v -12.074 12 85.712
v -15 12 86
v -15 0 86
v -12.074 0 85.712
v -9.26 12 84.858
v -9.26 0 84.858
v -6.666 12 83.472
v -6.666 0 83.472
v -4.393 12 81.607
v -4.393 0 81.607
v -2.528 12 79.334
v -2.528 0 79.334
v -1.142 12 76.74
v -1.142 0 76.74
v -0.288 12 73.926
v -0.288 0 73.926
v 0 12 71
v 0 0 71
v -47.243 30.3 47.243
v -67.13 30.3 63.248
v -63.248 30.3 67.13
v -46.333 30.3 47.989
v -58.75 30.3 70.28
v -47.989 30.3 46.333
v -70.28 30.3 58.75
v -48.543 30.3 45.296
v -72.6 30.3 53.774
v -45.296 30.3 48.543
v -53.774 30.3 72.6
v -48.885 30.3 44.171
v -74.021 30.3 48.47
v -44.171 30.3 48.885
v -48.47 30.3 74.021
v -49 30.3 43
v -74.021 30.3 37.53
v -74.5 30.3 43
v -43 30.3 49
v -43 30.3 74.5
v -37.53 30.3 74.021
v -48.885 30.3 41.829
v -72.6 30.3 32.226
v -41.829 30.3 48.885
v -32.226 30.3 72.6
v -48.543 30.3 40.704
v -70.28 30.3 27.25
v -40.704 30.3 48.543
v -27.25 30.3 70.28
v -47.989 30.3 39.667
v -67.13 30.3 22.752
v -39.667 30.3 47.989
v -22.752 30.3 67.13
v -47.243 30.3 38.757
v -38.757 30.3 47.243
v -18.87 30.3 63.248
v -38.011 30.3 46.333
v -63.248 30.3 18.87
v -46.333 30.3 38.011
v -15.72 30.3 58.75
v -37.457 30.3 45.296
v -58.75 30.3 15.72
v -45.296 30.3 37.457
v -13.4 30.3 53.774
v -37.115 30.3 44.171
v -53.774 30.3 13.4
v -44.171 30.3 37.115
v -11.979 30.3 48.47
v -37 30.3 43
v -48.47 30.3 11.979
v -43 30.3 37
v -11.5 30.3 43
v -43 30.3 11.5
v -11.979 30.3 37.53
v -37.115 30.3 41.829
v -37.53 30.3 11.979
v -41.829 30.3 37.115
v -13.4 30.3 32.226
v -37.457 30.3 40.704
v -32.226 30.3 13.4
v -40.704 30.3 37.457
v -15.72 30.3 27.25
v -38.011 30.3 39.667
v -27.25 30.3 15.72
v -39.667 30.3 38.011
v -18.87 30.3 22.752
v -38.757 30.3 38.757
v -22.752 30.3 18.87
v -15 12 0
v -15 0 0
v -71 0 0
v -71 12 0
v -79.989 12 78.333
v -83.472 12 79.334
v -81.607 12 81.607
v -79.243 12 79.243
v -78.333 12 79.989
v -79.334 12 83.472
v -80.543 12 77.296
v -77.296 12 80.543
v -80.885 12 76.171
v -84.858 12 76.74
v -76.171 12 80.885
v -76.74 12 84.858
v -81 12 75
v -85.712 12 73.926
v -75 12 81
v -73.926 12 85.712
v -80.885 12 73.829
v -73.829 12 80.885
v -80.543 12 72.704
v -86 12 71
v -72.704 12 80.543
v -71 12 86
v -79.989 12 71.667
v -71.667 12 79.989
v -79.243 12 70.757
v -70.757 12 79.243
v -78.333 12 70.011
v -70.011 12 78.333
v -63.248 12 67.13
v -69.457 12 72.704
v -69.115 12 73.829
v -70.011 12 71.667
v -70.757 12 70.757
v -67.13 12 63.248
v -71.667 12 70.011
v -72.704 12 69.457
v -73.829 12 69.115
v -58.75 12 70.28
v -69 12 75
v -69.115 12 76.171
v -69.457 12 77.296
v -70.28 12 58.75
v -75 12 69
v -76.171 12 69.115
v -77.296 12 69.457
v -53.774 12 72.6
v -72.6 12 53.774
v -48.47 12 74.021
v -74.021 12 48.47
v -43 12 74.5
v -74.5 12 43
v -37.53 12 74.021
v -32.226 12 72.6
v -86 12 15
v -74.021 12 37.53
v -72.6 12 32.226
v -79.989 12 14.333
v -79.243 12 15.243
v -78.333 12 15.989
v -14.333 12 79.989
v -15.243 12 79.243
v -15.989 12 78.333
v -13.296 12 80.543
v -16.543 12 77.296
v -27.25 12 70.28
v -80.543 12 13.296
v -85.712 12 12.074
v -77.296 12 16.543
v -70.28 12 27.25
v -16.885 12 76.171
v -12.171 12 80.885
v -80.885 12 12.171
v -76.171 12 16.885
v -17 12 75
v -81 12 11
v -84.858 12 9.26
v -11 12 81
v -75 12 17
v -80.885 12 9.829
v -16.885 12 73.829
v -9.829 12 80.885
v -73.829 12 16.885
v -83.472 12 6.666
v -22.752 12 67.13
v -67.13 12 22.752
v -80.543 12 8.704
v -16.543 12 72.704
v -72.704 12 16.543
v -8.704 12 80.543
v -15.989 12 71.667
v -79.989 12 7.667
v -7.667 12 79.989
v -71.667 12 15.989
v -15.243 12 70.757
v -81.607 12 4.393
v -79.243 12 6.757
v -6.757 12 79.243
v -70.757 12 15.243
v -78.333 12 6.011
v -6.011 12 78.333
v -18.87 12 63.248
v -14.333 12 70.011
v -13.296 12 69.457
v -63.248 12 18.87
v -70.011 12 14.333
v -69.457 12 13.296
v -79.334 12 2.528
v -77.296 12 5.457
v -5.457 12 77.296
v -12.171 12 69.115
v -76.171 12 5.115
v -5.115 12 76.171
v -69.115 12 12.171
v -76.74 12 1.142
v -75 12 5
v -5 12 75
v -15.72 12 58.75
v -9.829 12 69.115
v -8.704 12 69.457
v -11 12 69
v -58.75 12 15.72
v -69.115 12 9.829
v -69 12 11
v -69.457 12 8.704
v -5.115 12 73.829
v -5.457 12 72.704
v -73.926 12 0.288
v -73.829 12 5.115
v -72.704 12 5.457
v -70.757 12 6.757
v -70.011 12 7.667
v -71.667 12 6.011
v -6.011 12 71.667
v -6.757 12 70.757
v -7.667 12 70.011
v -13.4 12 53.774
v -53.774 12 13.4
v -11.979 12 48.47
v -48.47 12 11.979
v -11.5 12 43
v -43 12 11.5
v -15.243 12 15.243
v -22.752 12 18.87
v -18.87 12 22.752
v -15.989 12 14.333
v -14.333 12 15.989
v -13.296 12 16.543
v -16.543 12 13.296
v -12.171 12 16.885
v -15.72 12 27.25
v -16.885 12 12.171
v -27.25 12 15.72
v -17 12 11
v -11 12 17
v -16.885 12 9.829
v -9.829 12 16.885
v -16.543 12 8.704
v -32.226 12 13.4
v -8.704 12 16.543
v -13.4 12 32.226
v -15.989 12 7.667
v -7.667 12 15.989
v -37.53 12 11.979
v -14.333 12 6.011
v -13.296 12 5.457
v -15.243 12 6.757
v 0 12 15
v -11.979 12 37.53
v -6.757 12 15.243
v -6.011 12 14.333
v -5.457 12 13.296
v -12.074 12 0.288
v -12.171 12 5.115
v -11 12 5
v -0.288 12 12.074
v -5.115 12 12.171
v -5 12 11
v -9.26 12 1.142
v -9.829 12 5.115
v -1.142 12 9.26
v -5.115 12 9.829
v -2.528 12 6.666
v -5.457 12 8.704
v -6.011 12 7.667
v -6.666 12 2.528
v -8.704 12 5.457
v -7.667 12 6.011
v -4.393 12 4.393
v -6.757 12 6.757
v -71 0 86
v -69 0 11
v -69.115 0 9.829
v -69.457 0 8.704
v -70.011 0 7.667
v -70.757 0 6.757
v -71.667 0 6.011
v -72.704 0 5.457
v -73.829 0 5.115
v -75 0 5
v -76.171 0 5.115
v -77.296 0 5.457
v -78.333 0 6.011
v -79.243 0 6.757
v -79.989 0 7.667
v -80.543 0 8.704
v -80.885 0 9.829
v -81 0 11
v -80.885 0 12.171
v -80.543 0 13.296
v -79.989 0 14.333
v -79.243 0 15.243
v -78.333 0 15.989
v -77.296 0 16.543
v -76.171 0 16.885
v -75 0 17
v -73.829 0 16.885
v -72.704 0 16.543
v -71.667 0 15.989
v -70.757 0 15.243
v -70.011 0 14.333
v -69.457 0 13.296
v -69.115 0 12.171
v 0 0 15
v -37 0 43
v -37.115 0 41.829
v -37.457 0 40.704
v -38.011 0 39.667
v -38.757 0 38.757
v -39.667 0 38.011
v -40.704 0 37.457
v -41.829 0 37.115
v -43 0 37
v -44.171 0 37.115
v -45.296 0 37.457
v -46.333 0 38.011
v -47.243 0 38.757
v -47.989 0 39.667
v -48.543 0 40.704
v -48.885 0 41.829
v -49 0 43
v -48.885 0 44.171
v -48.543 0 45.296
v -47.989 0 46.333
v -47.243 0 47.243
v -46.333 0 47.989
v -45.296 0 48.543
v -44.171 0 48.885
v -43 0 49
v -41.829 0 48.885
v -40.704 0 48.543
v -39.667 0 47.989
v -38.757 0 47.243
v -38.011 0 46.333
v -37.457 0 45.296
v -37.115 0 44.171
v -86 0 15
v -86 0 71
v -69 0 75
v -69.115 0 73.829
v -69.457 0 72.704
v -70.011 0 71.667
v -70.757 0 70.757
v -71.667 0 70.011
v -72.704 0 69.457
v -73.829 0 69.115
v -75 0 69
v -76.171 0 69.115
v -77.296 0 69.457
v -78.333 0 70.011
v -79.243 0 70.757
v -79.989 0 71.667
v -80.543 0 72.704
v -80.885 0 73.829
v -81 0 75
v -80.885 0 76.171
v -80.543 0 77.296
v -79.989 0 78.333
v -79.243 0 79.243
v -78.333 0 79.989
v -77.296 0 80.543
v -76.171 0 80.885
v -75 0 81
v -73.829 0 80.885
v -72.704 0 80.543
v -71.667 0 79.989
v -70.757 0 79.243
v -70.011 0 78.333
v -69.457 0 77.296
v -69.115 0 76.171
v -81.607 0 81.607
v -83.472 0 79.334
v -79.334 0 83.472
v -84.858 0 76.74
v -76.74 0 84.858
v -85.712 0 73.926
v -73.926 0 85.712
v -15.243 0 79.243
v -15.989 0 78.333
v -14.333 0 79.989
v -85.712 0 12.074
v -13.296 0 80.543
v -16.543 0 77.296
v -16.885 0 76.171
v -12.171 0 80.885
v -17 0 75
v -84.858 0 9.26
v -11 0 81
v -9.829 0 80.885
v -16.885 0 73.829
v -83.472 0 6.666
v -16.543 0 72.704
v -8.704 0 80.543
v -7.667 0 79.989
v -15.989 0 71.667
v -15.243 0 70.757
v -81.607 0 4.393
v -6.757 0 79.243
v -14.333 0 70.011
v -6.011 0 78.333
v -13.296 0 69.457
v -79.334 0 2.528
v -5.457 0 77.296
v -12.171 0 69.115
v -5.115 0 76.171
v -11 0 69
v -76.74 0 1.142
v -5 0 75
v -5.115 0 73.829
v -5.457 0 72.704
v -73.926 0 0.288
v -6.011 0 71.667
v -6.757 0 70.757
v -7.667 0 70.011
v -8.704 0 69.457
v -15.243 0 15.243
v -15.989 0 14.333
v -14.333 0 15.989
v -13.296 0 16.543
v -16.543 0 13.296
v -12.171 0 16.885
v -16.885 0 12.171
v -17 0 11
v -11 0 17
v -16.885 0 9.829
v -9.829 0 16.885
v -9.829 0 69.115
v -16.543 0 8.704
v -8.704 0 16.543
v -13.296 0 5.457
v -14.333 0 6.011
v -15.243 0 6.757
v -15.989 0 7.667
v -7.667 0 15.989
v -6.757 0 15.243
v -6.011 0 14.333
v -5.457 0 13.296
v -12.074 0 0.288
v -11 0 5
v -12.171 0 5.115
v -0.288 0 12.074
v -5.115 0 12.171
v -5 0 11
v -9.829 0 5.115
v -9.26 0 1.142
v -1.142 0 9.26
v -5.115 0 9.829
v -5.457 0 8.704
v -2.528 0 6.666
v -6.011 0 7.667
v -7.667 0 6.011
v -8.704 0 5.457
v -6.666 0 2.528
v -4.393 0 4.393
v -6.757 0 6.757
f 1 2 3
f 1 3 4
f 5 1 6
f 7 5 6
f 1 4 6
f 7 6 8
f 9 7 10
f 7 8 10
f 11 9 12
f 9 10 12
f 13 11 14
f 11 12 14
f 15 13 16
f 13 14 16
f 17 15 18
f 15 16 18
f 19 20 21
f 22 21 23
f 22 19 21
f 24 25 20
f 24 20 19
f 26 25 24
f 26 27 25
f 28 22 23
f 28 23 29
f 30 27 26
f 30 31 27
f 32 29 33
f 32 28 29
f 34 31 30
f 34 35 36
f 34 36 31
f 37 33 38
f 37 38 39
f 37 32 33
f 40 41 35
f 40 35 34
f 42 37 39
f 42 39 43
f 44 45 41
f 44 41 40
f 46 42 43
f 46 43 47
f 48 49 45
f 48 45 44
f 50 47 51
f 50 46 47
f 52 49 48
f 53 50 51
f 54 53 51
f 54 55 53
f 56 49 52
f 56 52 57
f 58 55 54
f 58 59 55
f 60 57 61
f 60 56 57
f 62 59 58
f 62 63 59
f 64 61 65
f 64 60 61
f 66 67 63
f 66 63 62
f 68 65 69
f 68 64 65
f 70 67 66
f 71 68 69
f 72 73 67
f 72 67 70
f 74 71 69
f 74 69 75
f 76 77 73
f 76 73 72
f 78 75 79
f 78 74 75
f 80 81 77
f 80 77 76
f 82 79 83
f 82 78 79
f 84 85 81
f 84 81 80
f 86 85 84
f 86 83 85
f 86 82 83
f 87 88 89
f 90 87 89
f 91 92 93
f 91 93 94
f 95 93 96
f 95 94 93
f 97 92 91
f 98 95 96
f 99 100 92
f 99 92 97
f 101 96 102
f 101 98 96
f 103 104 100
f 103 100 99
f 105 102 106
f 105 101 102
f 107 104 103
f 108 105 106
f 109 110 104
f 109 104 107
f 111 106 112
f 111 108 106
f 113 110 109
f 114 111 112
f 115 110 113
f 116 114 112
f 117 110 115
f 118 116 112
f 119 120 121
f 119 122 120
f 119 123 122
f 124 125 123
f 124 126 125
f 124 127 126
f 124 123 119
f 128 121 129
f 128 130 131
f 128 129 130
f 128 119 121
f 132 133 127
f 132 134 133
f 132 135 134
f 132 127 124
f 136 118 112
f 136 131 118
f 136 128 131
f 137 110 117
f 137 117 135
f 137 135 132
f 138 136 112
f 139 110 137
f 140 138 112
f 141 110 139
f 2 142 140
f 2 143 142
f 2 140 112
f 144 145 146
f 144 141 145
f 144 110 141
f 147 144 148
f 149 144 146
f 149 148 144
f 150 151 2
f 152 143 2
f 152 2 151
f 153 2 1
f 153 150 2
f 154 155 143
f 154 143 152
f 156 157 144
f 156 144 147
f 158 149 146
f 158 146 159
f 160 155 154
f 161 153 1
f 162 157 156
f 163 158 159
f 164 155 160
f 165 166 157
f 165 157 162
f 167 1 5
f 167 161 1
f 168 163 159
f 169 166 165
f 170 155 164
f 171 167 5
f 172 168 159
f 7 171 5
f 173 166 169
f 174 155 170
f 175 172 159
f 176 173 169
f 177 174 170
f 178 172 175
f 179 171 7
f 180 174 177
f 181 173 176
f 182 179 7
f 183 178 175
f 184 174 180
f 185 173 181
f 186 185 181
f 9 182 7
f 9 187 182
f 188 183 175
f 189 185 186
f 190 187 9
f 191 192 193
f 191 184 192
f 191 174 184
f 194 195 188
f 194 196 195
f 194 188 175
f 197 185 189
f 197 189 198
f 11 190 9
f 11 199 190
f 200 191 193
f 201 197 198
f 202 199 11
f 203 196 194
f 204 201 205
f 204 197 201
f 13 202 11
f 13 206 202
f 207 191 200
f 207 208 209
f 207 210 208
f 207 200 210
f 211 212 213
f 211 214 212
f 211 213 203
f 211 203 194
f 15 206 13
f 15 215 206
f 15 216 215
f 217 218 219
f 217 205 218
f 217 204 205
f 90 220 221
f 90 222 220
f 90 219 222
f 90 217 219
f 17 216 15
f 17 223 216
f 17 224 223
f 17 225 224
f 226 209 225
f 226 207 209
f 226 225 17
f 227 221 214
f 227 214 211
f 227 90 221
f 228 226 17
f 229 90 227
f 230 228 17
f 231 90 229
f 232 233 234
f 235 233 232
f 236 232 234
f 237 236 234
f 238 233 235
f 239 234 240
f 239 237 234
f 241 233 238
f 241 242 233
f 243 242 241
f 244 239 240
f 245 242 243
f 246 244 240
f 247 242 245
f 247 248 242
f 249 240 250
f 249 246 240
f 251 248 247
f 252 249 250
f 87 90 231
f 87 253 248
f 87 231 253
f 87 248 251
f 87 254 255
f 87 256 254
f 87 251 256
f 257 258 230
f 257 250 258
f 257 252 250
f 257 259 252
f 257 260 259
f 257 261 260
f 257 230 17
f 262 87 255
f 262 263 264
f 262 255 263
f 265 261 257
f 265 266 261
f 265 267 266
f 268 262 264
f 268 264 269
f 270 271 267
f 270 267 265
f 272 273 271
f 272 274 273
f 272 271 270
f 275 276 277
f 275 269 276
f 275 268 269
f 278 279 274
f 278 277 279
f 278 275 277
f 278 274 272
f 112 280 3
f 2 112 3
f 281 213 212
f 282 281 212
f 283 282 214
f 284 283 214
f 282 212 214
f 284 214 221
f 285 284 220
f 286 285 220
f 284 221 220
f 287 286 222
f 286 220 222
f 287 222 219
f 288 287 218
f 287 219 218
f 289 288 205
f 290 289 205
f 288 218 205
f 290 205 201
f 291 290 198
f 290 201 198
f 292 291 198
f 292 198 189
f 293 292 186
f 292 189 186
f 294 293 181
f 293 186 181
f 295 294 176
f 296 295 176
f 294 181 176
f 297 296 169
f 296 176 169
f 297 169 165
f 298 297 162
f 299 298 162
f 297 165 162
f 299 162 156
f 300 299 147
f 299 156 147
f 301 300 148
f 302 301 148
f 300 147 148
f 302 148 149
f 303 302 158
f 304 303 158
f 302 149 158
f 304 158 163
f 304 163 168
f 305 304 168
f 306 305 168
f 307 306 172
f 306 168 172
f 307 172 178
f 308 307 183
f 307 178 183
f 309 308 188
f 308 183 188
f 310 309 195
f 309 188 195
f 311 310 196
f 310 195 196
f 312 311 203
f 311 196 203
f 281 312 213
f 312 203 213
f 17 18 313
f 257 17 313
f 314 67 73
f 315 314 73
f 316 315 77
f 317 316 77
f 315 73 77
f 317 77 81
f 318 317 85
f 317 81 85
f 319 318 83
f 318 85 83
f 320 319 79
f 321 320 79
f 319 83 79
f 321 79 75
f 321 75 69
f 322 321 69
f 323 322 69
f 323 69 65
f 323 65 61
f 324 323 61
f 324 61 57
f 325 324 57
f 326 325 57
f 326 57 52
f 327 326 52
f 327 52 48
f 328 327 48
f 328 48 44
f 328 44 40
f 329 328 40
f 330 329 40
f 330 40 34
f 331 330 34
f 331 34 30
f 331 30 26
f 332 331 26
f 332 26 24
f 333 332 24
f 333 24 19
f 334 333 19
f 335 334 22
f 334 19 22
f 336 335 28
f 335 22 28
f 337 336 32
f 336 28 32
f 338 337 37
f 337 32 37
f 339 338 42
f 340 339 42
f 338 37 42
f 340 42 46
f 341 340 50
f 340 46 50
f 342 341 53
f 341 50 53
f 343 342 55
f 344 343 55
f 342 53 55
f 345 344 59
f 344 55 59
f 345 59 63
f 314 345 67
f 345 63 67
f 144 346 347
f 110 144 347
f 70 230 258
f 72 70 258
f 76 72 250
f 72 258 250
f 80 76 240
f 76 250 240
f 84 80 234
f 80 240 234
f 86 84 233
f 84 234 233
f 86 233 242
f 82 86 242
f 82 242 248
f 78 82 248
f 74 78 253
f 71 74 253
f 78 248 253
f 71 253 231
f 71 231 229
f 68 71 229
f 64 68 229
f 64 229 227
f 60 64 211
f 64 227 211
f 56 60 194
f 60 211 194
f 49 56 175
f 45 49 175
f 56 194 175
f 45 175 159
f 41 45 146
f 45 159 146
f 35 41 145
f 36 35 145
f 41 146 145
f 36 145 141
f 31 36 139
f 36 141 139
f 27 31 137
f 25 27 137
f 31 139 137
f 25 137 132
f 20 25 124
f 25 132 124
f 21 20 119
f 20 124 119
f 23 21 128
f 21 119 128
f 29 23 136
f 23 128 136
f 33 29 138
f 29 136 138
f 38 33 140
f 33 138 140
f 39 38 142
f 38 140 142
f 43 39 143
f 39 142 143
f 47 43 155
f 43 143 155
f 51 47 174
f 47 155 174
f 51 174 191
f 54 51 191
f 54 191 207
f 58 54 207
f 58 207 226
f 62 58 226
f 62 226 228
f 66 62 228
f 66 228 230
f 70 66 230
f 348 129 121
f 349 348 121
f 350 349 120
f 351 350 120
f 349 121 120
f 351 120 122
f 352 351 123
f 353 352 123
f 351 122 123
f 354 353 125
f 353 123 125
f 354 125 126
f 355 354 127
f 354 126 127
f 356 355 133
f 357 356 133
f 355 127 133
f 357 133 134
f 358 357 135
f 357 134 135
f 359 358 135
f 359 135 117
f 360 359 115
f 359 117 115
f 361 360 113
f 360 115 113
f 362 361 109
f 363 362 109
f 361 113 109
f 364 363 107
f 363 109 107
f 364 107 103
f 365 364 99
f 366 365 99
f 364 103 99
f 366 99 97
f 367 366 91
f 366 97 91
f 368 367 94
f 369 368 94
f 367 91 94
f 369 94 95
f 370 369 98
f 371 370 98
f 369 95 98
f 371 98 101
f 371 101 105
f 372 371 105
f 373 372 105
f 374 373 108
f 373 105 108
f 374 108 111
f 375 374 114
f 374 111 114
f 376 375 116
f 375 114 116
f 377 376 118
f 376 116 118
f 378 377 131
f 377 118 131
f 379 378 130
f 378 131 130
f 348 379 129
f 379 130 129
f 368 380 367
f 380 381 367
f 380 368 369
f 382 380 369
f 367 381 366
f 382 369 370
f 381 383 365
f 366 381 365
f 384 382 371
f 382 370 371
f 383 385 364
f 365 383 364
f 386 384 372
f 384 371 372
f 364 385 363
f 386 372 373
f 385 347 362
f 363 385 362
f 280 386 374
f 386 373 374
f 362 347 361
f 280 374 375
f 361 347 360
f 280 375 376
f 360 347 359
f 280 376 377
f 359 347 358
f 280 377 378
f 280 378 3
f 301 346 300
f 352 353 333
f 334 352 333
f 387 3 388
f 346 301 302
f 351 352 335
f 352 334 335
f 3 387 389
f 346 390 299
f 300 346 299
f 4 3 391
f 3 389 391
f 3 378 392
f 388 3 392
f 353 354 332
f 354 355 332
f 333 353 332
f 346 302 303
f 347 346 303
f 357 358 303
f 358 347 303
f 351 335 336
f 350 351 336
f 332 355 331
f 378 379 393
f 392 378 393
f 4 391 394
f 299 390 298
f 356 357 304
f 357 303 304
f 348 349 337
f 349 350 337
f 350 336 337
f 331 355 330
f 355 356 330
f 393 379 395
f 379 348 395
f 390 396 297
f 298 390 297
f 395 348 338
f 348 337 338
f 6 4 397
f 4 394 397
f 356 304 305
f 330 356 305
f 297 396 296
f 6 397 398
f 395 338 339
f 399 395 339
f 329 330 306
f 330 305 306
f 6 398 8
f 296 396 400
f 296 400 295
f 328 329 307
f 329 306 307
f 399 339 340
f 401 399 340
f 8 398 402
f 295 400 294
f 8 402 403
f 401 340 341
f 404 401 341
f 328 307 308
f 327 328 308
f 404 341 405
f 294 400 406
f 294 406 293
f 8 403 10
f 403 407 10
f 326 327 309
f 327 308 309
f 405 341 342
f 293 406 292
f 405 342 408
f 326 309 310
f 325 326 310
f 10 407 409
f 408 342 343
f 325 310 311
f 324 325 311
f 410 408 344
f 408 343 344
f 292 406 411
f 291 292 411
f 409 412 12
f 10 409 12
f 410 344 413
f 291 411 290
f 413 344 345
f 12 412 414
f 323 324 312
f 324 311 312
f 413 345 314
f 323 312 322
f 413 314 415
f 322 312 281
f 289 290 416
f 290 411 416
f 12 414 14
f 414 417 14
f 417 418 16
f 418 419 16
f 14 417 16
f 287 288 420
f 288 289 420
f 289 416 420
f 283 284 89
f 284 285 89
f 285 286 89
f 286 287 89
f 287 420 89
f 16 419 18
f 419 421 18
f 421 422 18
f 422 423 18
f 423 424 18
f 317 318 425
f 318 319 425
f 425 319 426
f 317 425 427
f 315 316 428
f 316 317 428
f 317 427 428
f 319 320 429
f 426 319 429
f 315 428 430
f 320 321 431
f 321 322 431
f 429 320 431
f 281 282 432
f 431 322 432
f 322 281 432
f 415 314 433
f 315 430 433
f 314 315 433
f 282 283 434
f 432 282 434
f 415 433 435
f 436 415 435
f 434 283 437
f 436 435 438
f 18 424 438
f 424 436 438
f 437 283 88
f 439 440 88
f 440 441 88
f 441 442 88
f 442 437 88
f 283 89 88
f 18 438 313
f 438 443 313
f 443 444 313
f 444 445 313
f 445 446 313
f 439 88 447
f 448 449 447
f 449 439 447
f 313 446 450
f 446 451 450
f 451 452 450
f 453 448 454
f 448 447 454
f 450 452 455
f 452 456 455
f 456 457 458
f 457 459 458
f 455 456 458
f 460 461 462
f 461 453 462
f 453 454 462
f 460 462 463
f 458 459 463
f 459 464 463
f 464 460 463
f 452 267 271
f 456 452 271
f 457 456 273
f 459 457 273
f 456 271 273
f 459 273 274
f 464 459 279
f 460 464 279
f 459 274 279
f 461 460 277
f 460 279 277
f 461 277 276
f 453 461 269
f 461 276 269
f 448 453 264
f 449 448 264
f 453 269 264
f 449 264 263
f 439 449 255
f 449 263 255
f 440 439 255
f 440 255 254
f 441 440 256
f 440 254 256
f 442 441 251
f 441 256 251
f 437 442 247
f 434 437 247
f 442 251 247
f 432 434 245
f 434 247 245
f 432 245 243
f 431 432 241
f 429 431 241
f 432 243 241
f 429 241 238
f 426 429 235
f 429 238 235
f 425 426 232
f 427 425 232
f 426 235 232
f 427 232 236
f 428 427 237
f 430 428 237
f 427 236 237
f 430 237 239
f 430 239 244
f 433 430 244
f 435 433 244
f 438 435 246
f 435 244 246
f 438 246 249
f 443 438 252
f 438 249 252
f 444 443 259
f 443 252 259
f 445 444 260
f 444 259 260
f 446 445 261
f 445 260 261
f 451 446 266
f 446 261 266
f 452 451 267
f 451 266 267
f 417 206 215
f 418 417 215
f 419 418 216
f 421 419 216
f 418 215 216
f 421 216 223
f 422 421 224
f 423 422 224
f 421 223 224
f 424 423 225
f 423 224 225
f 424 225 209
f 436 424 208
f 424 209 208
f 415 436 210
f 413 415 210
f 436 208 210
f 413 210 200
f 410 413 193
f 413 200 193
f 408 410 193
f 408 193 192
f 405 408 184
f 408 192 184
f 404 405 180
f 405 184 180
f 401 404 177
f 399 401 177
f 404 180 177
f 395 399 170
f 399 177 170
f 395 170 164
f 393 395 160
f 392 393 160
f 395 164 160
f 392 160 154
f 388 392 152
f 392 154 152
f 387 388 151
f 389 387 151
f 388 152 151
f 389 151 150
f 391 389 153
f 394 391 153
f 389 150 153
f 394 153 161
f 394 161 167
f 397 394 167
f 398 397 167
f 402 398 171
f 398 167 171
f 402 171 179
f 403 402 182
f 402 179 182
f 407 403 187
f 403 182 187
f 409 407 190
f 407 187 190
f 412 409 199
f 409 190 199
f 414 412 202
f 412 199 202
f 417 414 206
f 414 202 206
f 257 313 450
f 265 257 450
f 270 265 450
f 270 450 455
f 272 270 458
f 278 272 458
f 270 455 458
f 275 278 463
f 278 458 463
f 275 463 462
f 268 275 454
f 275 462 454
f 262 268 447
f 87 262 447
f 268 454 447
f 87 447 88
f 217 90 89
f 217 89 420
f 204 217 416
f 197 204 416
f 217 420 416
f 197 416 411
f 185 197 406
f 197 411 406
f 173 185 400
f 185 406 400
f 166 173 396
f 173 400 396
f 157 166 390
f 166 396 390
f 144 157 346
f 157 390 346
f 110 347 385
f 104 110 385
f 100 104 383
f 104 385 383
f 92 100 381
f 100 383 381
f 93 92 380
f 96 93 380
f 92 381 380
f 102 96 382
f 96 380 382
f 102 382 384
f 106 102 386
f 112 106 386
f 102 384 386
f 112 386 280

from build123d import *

# Parameters (mm, degrees)
BOSS_EXTRUDE1_DEPTH = 12
SKETCH2_R           = 6
CUT_EXTRUDE1_DEPTH  = 12
SKETCH3_R           = 31.5
BOSS_EXTRUDE2_DEPTH = 18.3
SKETCH4_R           = 6
CUT_EXTRUDE2_DEPTH  = 31.3


with BuildPart() as part:
    # Sketch1 → Boss-Extrude1 (new body)
    with BuildSketch(Plane(origin=(0, 0, 0), x_dir=(1, 0, 0), z_dir=(0, 1, 0))):
        with BuildLine():
            Line((-15, 0), (-71, 0))
            ThreePointArc((-71, 0), (-81.606601718, -4.393398282), (-86, -15))
            Line((-86, -15), (-86, -71))
            ThreePointArc((-86, -71), (-81.606601718, -81.606601718), (-71, -86))
            Line((-71, -86), (-15, -86))
            ThreePointArc((-15, -86), (-4.393398282, -81.606601718), (0, -71))
            Line((0, -71), (0, -15))
            ThreePointArc((0, -15), (-4.393398282, -4.393398282), (-15, 0))
        make_face()
    extrude(amount=BOSS_EXTRUDE1_DEPTH)

    # Sketch2 → Cut-Extrude1 (cut)
    with BuildSketch(Plane(origin=(0, 12, 0), x_dir=(1, 0, 0), z_dir=(0, 1, 0))):
        with Locations((-75, -11)):
            Circle(SKETCH2_R)
        with Locations((-11, -11)):
            Circle(SKETCH2_R)
        with Locations((-11, -75)):
            Circle(SKETCH2_R)
        with Locations((-75, -75)):
            Circle(SKETCH2_R)
    extrude(amount=-CUT_EXTRUDE1_DEPTH, mode=Mode.SUBTRACT)

    # Sketch3 → Boss-Extrude2 (add)
    with BuildSketch(Plane(origin=(0, 12, 0), x_dir=(1, 0, 0), z_dir=(0, 1, 0))):
        with Locations((-43, -43)):
            Circle(SKETCH3_R)
    extrude(amount=BOSS_EXTRUDE2_DEPTH)

    # Sketch4 → Cut-Extrude2 (cut, through all)
    with BuildSketch(Plane(origin=(0, 30.3, 0), x_dir=(1, 0, 0), z_dir=(0, 1, 0))):
        with Locations((-43, -43)):
            Circle(SKETCH4_R)
    extrude(amount=-CUT_EXTRUDE2_DEPTH, mode=Mode.SUBTRACT)


solid = part.part
